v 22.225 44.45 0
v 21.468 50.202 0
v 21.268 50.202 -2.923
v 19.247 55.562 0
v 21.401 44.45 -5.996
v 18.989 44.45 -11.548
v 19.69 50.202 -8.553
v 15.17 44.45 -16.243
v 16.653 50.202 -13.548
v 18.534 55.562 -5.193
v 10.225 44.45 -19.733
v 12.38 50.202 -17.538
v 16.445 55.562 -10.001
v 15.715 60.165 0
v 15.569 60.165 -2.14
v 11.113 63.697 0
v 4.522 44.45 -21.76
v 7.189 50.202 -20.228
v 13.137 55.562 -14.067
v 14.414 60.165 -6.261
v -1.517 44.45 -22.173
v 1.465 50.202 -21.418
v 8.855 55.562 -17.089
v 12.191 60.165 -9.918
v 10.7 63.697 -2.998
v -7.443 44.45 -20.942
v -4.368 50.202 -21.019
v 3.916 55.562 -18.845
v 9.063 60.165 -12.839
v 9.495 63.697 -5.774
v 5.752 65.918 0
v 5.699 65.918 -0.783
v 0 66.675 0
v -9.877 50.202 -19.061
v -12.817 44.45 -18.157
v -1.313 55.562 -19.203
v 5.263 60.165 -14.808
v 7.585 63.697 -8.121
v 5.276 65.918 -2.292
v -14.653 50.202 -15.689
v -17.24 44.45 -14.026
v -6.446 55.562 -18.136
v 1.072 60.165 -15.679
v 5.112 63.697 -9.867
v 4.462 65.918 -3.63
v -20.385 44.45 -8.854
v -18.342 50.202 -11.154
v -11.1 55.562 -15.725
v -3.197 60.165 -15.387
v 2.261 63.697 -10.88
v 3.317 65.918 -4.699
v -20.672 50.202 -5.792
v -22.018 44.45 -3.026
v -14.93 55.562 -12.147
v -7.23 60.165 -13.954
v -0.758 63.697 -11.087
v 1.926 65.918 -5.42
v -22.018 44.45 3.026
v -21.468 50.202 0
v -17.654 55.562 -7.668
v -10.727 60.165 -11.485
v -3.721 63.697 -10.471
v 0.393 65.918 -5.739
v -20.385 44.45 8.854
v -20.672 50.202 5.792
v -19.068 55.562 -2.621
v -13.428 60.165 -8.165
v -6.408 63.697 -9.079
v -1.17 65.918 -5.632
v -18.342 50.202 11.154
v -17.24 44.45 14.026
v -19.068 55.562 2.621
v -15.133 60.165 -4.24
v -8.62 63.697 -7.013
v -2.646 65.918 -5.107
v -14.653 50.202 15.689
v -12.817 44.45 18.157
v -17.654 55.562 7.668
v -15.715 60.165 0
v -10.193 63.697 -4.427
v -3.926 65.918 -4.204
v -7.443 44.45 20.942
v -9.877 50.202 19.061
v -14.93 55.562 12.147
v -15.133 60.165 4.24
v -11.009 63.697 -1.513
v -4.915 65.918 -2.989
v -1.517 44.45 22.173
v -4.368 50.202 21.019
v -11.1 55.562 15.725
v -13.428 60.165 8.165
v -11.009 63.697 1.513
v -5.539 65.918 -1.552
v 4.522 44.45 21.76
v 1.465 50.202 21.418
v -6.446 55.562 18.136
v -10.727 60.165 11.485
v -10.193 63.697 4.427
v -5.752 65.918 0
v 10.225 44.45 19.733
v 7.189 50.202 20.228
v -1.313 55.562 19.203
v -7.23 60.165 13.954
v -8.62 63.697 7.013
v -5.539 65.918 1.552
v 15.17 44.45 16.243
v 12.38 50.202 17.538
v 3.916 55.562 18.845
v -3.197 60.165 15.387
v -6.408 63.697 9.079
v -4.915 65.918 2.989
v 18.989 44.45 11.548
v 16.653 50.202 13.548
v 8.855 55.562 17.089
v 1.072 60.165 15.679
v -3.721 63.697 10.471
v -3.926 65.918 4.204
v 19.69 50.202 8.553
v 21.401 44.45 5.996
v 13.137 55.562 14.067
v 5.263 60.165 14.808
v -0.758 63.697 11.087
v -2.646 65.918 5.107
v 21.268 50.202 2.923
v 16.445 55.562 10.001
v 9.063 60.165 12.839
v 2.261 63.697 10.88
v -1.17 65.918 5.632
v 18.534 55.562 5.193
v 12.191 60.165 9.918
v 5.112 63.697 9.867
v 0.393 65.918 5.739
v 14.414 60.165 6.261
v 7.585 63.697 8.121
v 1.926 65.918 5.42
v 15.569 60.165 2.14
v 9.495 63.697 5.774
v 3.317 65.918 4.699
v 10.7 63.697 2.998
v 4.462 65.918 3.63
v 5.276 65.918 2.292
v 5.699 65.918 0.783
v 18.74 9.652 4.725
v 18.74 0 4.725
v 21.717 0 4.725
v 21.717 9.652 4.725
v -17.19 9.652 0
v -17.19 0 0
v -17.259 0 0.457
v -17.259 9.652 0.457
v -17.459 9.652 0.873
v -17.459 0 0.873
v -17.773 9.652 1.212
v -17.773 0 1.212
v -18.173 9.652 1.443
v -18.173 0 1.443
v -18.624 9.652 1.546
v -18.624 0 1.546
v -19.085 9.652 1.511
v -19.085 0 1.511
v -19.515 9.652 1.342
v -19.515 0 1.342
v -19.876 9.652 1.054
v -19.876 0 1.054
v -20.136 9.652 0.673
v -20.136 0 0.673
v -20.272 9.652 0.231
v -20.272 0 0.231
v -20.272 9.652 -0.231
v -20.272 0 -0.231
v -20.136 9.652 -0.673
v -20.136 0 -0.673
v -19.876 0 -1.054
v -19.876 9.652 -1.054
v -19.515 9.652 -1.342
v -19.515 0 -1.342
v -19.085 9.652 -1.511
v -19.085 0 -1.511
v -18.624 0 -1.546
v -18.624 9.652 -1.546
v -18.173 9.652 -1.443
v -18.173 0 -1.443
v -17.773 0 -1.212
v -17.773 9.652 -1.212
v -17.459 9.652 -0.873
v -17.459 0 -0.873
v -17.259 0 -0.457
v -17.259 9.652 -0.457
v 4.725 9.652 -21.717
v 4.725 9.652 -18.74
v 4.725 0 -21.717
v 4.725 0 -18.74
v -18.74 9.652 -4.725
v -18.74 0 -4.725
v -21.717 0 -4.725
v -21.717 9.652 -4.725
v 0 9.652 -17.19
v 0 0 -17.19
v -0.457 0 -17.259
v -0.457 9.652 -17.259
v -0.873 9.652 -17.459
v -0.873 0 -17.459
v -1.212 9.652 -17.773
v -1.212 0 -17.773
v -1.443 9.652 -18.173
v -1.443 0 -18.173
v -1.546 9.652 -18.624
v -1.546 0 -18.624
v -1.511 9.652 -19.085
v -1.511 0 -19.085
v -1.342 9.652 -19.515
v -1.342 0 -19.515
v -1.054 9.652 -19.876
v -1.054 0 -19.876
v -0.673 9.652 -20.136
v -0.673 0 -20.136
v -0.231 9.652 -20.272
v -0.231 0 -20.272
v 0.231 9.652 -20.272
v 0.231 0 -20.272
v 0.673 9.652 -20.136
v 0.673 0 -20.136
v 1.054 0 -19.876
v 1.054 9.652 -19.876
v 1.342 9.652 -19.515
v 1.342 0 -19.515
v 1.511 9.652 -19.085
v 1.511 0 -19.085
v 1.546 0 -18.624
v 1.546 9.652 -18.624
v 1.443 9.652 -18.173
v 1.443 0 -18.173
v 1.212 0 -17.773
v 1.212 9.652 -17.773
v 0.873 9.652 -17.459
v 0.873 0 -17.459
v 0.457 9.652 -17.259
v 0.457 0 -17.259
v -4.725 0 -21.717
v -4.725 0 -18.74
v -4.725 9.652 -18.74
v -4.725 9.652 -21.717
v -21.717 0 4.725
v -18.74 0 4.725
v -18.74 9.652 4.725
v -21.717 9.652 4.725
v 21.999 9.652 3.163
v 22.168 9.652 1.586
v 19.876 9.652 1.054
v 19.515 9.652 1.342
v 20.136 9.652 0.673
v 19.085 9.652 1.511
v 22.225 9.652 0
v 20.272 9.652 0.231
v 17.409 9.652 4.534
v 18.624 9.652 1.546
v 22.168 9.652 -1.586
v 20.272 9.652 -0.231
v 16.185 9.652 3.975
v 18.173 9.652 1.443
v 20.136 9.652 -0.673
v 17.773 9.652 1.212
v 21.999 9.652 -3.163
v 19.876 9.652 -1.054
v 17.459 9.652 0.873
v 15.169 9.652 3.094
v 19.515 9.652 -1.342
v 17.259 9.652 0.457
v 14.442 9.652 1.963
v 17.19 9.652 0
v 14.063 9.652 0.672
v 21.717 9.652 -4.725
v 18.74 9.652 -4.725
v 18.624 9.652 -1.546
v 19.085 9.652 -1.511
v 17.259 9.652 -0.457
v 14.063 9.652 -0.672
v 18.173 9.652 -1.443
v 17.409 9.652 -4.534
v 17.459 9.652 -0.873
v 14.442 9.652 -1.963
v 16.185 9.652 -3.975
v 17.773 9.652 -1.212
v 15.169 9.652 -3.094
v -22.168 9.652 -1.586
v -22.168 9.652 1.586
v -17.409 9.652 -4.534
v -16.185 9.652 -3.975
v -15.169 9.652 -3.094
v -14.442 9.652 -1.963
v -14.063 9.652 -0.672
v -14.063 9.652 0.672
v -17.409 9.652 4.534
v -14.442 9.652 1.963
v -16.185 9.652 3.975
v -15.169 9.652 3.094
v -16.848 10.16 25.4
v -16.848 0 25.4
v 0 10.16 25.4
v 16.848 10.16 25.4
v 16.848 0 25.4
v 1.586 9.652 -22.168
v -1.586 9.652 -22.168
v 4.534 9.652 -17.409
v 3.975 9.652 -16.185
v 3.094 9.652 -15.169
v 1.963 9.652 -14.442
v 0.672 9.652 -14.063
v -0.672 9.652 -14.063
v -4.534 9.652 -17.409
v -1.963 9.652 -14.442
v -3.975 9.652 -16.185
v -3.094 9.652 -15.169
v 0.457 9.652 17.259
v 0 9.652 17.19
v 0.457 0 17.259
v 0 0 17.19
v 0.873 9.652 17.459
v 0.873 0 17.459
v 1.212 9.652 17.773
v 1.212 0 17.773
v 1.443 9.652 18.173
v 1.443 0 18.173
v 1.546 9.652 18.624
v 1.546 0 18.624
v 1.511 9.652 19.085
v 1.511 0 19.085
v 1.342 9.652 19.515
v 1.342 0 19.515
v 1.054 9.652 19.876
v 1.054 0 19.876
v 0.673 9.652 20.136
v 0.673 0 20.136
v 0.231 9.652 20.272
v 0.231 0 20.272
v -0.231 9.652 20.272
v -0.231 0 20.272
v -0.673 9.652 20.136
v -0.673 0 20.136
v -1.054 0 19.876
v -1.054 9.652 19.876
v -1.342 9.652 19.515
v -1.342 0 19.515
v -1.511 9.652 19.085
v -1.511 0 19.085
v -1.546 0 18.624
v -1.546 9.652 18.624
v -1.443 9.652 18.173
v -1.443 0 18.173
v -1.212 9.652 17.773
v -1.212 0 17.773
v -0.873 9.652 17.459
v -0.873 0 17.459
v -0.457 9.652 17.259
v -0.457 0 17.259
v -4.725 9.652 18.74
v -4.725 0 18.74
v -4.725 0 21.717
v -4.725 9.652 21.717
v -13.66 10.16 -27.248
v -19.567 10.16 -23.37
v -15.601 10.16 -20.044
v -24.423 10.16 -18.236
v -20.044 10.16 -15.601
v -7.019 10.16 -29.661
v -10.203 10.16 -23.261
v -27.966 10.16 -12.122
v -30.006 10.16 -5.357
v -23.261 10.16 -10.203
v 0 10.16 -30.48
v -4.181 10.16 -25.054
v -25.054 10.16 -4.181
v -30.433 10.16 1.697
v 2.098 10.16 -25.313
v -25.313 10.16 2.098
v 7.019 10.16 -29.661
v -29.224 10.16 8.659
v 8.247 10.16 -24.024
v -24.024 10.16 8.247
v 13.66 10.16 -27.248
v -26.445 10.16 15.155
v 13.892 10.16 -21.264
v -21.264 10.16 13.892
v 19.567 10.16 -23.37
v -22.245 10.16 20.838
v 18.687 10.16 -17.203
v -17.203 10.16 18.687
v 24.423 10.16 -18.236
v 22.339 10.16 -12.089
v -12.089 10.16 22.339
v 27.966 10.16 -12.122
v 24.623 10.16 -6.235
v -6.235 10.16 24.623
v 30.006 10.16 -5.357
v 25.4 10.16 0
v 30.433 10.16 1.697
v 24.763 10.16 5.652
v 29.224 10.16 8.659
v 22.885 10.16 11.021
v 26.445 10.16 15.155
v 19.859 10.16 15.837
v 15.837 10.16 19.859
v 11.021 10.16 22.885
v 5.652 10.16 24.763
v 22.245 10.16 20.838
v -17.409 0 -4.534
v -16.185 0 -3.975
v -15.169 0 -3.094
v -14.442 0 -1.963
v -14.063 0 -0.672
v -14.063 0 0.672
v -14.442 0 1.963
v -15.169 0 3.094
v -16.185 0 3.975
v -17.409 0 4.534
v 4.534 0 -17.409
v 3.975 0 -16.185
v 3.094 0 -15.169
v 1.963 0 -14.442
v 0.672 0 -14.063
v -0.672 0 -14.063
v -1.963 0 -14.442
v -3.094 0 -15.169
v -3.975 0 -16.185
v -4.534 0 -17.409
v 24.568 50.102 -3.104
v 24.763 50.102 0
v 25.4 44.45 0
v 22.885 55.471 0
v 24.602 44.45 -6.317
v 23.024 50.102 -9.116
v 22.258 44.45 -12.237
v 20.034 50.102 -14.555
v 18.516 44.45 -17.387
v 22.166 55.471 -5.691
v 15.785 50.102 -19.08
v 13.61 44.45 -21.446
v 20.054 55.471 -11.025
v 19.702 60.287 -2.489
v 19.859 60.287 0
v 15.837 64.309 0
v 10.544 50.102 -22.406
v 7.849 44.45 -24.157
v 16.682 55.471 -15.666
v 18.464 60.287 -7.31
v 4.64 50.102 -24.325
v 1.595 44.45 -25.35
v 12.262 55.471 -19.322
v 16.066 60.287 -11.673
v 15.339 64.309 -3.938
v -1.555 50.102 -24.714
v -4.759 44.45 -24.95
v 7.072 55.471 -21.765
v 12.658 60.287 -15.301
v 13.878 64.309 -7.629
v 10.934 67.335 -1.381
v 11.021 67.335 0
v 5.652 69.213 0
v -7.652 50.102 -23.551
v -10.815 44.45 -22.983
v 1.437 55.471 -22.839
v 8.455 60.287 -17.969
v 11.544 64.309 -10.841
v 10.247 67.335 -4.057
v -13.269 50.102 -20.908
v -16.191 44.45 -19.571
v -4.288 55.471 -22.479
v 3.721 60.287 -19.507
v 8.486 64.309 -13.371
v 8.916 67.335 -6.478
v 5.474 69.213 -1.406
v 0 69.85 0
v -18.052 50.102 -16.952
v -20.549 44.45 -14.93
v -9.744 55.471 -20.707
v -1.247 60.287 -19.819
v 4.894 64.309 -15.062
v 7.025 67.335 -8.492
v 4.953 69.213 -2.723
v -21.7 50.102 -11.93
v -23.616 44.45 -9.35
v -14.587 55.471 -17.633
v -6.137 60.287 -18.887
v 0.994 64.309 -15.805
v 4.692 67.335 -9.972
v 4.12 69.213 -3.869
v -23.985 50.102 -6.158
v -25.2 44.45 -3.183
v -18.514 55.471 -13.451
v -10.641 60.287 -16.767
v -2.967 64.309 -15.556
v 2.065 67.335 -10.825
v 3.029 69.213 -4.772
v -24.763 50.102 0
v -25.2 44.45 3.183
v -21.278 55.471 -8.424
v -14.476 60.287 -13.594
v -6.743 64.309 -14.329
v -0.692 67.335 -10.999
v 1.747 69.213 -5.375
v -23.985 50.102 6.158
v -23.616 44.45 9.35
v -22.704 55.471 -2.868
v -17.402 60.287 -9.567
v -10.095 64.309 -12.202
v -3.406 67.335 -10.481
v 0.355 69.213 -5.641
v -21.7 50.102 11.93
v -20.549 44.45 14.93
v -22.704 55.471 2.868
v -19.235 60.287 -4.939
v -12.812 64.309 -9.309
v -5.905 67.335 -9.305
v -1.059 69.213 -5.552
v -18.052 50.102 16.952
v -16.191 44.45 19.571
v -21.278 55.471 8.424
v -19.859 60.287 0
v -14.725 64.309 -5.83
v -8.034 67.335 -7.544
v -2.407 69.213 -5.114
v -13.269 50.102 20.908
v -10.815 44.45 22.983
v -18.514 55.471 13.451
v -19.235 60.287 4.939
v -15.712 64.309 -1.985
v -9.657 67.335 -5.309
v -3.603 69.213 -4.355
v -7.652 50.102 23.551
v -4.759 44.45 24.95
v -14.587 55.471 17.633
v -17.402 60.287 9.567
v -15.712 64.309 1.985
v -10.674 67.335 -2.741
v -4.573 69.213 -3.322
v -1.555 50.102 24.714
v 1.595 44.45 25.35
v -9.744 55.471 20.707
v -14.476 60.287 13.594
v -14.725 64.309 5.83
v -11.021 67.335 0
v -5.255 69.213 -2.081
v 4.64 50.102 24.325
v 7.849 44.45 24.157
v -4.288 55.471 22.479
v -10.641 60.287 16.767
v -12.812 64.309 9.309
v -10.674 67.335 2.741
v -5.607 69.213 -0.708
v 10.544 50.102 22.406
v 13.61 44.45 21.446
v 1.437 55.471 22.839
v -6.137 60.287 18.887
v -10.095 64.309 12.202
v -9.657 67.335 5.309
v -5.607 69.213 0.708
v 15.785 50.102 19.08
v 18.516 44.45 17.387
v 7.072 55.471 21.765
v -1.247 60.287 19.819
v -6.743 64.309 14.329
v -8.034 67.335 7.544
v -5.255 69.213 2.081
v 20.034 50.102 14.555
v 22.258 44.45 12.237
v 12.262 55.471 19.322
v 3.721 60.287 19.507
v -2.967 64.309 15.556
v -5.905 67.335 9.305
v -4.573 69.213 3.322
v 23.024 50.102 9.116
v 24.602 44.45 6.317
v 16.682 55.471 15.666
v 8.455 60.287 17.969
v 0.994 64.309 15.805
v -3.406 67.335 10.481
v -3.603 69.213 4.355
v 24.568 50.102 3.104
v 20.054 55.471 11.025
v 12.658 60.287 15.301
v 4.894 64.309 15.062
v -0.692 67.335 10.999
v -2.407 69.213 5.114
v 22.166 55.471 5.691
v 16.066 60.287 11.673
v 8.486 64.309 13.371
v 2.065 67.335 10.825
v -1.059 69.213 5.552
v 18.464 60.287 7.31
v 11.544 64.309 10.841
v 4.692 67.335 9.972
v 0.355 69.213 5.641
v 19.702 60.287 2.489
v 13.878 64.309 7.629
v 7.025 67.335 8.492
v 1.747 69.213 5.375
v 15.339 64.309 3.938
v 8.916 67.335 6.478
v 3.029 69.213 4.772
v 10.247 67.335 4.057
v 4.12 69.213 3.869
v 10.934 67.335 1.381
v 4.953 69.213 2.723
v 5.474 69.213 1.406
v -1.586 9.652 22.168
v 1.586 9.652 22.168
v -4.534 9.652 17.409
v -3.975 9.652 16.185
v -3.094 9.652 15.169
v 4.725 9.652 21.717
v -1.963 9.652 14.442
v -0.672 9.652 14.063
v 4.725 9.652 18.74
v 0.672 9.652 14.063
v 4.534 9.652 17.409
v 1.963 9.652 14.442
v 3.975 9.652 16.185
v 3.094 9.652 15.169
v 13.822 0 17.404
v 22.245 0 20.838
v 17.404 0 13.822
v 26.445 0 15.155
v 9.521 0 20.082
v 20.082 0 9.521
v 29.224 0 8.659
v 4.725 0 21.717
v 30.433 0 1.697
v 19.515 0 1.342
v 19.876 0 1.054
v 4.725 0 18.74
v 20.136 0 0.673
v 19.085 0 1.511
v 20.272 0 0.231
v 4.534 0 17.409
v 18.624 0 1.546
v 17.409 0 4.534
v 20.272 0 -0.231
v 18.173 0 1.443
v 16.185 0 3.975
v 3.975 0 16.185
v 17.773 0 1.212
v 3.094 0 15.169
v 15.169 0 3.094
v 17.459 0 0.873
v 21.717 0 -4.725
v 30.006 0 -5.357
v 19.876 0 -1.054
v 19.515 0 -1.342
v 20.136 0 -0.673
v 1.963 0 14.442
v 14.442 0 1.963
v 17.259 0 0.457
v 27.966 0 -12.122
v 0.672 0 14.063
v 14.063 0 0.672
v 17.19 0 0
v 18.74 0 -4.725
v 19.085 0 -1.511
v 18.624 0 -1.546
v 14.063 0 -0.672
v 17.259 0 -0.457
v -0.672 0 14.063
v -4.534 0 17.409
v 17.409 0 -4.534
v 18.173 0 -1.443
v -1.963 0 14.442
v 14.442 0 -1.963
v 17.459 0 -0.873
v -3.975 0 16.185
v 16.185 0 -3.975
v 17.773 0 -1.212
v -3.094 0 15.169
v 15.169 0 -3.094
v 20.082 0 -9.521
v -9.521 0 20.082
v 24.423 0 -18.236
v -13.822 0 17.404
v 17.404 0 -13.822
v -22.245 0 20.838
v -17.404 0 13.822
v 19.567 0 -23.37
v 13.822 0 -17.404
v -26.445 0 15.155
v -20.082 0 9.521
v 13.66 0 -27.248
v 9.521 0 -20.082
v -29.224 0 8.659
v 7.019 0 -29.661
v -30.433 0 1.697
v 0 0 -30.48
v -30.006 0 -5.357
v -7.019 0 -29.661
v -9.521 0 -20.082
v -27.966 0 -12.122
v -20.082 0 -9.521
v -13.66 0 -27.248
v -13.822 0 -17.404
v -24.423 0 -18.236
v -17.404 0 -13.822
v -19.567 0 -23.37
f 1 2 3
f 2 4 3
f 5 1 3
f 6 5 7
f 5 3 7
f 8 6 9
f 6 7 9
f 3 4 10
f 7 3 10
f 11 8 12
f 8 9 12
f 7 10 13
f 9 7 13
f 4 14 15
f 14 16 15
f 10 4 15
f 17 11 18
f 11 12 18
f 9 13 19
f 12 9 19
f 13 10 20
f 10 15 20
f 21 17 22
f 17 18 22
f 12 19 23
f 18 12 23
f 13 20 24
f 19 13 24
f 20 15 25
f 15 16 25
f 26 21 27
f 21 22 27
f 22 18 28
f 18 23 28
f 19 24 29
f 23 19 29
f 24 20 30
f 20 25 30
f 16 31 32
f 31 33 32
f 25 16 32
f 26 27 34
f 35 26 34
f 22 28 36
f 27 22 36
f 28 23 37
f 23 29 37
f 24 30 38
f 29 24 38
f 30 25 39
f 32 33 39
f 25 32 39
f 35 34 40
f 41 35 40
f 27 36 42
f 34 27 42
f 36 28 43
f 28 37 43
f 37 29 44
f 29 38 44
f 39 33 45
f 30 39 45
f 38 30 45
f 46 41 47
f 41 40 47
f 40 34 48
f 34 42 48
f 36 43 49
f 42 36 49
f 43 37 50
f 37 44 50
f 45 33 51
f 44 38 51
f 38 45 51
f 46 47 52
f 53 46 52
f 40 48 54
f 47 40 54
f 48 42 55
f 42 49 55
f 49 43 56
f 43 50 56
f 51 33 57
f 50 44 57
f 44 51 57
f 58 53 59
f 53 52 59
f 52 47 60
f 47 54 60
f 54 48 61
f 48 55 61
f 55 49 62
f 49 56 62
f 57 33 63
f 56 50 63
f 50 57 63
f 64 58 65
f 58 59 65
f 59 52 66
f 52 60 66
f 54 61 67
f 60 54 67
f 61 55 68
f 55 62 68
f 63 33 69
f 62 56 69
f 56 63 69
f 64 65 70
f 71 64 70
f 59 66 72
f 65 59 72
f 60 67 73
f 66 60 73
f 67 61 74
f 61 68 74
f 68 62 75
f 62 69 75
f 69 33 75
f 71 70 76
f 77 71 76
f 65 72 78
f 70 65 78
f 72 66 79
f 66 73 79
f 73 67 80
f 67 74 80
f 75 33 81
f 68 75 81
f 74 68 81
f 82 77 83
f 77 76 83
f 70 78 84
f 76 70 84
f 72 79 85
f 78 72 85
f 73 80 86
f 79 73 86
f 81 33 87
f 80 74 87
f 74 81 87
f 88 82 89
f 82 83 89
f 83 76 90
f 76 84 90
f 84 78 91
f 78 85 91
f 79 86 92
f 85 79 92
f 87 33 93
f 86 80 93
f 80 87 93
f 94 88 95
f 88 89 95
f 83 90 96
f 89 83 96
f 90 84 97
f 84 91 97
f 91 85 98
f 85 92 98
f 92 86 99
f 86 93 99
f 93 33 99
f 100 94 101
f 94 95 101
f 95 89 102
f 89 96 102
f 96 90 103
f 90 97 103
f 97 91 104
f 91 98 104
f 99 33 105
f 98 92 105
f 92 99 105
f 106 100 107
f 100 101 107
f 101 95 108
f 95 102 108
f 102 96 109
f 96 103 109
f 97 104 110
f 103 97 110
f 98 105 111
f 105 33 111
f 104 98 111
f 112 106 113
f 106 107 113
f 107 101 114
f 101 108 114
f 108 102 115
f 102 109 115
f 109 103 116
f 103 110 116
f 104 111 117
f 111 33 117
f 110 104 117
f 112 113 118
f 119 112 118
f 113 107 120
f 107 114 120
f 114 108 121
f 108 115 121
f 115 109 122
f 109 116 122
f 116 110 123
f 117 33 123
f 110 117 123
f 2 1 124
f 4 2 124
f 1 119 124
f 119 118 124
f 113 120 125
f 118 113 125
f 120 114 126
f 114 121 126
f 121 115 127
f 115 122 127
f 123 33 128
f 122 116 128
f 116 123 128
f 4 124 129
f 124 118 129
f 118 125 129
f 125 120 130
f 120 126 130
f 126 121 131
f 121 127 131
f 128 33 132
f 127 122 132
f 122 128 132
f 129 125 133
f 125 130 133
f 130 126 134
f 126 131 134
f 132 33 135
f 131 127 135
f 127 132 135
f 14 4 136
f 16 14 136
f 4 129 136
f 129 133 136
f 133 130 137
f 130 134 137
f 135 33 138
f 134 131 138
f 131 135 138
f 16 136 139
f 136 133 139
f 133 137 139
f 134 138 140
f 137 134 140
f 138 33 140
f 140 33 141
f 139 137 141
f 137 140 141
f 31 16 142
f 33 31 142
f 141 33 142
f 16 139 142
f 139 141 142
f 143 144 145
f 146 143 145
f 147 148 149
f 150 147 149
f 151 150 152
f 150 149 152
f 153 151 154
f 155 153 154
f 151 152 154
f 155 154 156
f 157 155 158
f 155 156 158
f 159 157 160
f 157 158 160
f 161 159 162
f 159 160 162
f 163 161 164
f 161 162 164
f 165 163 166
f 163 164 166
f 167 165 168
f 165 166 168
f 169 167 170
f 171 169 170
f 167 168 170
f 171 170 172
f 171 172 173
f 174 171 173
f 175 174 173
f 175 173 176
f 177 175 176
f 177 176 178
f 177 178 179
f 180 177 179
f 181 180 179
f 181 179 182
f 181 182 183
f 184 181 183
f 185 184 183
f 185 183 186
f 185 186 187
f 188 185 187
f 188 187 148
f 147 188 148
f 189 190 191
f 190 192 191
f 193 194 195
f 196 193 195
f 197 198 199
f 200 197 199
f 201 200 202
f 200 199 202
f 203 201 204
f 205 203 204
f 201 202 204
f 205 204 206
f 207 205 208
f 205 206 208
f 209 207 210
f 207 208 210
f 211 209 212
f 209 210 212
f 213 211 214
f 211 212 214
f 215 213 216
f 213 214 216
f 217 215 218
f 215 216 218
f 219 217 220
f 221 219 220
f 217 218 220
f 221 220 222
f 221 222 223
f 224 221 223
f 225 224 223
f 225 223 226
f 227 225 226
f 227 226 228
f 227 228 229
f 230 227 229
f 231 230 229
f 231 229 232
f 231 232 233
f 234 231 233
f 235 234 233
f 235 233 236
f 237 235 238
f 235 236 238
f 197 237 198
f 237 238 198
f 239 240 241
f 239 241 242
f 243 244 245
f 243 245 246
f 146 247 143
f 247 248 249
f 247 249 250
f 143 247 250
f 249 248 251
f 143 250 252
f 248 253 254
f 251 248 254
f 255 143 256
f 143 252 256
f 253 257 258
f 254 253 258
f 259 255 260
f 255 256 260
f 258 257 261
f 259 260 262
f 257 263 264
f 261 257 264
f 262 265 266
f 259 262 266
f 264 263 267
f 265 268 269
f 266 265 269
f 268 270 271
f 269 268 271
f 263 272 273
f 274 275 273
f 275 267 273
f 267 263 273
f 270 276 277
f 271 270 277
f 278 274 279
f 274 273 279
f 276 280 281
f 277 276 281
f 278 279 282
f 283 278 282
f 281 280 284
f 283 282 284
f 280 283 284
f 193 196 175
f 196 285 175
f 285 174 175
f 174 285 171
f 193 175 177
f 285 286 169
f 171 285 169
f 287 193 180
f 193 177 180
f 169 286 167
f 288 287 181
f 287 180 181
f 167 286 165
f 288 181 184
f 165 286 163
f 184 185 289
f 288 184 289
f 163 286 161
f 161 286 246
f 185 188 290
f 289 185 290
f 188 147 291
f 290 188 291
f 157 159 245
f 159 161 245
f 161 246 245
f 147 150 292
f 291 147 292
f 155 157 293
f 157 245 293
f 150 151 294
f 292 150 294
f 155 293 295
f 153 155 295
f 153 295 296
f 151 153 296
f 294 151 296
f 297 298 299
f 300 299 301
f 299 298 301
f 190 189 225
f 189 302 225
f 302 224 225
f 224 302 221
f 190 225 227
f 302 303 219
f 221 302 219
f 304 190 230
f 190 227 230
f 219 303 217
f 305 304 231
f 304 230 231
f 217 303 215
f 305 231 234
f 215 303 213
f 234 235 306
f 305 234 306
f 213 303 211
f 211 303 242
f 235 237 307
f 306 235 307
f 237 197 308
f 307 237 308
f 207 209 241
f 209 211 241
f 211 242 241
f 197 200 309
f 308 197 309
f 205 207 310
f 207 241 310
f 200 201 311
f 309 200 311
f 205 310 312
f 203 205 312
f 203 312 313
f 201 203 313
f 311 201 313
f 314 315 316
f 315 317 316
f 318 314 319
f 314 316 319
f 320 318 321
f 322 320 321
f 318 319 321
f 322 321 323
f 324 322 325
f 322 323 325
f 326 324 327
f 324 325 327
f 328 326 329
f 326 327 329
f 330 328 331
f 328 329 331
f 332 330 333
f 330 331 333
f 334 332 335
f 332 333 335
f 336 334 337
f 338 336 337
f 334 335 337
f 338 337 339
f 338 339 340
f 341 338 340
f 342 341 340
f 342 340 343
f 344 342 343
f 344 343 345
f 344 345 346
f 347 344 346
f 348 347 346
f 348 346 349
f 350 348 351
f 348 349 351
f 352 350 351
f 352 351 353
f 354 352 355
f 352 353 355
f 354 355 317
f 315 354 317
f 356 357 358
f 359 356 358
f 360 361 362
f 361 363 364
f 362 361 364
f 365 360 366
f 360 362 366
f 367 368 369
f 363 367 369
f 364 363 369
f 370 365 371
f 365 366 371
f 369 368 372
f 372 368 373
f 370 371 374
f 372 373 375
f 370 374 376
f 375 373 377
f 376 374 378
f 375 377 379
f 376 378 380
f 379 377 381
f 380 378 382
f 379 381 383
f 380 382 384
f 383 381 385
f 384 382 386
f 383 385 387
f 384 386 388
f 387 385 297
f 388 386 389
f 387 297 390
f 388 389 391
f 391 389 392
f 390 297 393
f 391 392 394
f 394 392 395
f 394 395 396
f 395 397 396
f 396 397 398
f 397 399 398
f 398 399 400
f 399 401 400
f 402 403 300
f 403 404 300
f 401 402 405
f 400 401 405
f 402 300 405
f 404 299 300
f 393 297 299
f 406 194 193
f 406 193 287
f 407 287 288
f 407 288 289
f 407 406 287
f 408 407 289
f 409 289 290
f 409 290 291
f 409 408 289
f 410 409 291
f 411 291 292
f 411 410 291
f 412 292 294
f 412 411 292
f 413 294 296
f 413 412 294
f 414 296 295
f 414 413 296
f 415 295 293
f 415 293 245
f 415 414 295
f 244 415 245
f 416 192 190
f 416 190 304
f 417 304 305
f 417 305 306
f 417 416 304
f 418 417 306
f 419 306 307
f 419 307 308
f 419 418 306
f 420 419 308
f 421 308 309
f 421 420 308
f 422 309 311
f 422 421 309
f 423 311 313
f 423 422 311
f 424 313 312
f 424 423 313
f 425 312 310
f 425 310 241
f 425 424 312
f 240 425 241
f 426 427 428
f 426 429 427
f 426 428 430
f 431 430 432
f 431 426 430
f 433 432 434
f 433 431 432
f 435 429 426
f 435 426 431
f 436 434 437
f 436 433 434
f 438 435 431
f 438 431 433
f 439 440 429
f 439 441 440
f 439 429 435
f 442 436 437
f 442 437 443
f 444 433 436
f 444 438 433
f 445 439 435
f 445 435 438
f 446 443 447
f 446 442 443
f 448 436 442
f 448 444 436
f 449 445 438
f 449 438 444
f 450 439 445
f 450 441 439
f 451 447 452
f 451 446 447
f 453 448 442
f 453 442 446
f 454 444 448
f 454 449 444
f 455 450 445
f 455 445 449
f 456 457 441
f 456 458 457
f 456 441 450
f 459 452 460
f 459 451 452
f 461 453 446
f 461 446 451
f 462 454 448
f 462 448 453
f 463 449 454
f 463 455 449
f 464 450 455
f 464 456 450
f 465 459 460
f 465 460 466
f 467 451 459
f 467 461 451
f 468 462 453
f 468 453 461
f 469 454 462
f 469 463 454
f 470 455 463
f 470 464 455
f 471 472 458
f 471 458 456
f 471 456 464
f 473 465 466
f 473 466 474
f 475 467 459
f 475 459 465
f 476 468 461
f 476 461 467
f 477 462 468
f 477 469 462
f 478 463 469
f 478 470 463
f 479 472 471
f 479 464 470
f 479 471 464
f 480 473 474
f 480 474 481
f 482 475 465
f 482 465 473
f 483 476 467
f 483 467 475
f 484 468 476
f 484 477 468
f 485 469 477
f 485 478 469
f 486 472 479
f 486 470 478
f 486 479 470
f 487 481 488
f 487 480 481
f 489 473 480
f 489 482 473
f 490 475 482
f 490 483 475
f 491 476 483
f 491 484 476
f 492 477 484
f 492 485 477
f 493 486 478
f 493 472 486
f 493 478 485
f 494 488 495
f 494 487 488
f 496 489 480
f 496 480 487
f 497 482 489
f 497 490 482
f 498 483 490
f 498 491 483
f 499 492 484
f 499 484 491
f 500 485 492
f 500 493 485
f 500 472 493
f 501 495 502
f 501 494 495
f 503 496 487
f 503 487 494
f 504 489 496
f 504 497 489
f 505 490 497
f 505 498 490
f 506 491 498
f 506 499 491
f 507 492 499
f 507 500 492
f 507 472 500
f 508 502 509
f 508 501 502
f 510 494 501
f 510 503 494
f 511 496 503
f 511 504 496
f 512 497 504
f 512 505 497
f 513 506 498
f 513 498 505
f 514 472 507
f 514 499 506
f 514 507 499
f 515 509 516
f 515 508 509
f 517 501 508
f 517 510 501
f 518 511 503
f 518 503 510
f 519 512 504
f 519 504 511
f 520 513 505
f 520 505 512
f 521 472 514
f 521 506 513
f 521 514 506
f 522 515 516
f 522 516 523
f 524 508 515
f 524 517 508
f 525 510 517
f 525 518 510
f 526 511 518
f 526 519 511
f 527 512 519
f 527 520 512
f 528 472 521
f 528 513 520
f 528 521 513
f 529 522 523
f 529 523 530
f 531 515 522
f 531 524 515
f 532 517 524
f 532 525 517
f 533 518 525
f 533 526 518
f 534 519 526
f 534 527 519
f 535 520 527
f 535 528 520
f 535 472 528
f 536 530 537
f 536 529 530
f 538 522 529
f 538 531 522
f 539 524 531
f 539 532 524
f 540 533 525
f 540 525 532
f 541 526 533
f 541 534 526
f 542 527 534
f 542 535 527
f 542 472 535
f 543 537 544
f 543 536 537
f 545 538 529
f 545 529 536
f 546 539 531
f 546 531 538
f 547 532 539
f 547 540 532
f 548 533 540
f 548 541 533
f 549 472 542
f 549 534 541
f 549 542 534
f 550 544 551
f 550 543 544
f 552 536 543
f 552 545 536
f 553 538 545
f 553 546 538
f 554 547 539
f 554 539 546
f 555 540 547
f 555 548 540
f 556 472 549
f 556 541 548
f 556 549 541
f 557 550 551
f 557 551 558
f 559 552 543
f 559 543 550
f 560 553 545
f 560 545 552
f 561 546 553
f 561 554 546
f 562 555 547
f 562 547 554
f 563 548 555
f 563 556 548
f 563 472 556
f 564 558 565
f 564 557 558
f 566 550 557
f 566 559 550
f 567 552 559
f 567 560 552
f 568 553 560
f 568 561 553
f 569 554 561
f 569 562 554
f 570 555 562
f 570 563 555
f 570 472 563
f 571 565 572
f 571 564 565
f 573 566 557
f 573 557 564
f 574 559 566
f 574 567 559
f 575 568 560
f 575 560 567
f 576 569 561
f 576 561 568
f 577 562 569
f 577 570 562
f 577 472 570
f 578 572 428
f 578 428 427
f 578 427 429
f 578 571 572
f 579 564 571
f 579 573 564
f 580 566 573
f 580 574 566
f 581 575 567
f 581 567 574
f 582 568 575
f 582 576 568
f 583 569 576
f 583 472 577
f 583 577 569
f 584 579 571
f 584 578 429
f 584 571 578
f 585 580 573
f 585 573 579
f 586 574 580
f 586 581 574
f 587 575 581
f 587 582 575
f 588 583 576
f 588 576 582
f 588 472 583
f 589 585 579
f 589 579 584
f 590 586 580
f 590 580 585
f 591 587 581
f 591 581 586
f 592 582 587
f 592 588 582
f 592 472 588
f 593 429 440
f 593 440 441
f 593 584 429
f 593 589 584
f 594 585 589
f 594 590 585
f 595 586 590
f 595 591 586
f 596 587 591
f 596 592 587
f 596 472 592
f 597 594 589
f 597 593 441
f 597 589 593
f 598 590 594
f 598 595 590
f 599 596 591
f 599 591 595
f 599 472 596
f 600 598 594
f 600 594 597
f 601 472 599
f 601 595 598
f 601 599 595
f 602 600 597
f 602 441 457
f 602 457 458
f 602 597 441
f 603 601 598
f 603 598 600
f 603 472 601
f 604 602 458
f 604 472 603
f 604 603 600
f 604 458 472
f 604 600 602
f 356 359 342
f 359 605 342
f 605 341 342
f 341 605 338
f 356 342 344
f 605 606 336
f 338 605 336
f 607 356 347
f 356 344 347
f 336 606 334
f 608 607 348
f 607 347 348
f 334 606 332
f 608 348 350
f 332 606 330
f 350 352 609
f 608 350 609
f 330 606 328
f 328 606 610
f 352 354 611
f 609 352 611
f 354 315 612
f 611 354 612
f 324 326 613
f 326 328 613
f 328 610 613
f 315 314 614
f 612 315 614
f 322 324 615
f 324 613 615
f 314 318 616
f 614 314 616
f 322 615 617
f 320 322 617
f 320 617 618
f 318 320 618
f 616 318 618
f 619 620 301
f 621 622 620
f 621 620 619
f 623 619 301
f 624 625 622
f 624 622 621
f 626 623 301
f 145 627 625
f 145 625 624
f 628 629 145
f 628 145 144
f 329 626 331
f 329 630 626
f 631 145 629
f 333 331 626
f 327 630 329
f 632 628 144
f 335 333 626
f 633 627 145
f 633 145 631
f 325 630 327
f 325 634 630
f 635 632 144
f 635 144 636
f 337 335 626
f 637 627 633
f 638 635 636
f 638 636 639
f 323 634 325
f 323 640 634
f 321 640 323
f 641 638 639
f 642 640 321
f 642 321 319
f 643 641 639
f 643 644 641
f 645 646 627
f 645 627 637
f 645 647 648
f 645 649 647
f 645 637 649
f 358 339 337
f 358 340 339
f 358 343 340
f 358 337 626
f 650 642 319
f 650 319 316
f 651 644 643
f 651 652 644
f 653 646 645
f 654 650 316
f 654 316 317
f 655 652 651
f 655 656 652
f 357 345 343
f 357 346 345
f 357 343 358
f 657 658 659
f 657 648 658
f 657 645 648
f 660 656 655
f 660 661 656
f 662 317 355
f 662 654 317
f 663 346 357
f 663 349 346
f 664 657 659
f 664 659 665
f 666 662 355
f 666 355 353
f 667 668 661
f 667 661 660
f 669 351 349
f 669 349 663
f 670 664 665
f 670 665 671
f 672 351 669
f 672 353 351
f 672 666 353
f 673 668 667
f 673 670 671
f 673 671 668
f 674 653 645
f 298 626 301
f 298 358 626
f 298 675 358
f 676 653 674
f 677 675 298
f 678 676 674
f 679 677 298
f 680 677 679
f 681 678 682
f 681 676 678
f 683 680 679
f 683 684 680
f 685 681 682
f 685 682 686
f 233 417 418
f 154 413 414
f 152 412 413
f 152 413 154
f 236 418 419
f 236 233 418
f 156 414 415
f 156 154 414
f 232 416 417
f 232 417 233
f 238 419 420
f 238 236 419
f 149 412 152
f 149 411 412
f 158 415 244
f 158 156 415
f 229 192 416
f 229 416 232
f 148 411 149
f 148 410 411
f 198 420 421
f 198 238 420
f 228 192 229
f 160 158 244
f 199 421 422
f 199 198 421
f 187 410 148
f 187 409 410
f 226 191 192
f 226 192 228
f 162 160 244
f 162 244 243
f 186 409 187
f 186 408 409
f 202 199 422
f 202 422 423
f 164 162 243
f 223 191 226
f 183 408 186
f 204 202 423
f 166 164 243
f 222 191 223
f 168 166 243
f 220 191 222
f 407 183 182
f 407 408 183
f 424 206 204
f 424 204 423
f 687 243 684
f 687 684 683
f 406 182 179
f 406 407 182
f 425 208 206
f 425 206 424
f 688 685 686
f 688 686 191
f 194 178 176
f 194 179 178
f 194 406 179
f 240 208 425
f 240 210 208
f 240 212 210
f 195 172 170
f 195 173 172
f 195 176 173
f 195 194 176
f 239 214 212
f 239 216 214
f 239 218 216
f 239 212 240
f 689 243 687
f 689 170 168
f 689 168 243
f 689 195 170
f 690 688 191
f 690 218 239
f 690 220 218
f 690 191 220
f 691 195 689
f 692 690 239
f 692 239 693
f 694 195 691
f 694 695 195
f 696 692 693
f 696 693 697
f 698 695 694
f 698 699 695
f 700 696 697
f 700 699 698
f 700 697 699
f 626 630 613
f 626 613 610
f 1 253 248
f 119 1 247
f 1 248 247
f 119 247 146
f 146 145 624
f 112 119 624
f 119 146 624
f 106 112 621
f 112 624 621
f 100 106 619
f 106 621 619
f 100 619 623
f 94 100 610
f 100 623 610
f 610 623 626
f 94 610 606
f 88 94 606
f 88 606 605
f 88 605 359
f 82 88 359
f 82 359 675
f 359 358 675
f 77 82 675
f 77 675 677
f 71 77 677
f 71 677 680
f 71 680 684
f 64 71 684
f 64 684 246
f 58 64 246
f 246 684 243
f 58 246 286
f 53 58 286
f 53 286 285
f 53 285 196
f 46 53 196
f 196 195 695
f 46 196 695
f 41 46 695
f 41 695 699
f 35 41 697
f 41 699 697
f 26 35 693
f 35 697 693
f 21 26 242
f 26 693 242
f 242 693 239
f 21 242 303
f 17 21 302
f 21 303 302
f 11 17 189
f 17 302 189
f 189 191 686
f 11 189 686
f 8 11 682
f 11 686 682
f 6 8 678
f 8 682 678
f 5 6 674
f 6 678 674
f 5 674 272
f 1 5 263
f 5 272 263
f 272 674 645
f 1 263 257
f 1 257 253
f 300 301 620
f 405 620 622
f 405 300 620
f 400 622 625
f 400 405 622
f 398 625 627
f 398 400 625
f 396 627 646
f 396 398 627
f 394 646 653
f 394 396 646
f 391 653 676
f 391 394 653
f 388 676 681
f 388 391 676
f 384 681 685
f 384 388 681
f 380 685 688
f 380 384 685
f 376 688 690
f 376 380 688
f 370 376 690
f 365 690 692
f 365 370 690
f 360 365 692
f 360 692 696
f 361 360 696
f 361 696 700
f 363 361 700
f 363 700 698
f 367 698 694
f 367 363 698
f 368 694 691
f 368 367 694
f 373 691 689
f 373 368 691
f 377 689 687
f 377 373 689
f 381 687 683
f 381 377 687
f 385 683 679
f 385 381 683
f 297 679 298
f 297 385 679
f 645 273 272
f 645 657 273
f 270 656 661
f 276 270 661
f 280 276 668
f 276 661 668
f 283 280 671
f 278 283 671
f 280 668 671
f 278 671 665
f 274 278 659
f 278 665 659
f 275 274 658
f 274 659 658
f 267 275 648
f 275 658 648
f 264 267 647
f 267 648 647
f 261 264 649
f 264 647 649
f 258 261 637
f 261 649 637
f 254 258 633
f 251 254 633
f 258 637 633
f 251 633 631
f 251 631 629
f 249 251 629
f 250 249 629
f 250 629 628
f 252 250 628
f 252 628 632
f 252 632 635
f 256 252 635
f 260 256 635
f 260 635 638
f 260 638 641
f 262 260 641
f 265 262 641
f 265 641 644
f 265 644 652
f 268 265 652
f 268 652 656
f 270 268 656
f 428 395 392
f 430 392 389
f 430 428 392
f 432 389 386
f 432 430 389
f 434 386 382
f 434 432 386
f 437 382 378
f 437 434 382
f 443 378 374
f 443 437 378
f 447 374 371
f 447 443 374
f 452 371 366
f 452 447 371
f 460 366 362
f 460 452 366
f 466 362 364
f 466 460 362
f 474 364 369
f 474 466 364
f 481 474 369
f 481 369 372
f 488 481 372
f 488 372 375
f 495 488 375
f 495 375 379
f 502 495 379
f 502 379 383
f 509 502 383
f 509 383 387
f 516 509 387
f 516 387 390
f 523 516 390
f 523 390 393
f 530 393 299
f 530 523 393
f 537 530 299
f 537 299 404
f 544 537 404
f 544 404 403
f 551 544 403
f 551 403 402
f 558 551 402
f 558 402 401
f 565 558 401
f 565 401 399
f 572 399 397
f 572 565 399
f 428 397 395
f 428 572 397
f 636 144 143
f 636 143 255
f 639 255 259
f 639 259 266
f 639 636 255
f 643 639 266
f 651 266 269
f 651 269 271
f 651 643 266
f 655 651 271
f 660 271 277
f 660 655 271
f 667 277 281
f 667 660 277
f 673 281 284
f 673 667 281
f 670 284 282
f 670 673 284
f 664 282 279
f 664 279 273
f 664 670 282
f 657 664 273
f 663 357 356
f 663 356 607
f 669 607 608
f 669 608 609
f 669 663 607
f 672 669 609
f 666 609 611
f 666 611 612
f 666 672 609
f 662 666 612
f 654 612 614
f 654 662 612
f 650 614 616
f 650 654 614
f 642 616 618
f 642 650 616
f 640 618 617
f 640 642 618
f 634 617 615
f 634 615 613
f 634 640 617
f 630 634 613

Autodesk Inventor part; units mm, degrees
ref_plane "YZ Plane" through (0, 0, 0) normal (1, 0, 0) x (0, 1, 0)
ref_plane "XZ Plane" through (0, 0, 0) normal (0, 1, 0) x (-1, 0, 0)
ref_plane "XY Plane" through (0, 0, 0) normal (0, 0, 1) x (1, 0, 0)
sketch "Sketch1" plane through (0, 0, 0) normal (0, 0, 1) x (1, 0, 0)
  line L0 (22.225, 0) -> (30.48, 0)
  line L1 (30.48, 0) -> (30.48, 10.16)
  line L2 (30.48, 10.16) -> (25.4, 10.16)
  line L3 (25.4, 10.16) -> (25.4, 44.45)
  line L4 (25.4, 44.45) -> (0, 44.45) construction
  line L5 (0, 10.16) -> (0, 0)
  arc A0 (25.4, 44.45) -> (0, 69.85) centre (0, 44.45) ccw
  line L6 (0, 66.675) -> (0, 69.85)
  arc A1 (22.225, 44.45) -> (0, 66.675) centre (0, 44.45) ccw
  line L7 (22.225, 44.45) -> (22.225, 0)
  line L8 (0, 66.675) -> (0, 0) construction
  line L9 (0, 0) -> (22.225, 0) construction
  dimension "d2" = 3.175
  dimension "d3" = 10.16
  dimension "d4" = 69.85
  dimension "d6" = 25.4
  dimension "d7" = 5.08
revolve "Revolution1" add sketch "Sketch1" angle 360 about axis through (0, 66.675, 0) along (0, -1, 0)
sketch "Sketch3" plane through (0, 0, 0) normal (0, -1, 0) x (1, 0, 0)
  circle A0 centre (0, 0) radius 25.4 construction
  circle A1 centre (0, 0) radius 30.48 projected
  line L0 (0, 25.4) -> (-16.8485, 25.4)
  line L1 (0, 25.4) -> (16.8485, 25.4)
  arc A2 (-16.8485, 25.4) -> (0, 30.48) centre (0, 0) ccw
extrude "Extrusion1" cut sketch "Sketch3" against normal up to next contours L1 L0 A1 picked at (-9.4832, 26.3286)
sketch "Sketch4" plane through (0, 0, 0) normal (0, -1, 0) x (1, 0, 0)
  arc A0 (-18.7397, -4.725) -> (-18.7397, 4.725) centre (-18.7397, 0) ccw
  circle A1 centre (-18.7397, 0) radius 1.55
  line L0 (-18.7397, 4.725) -> (-21.7169, 4.725)
  line L1 (-18.7397, -4.725) -> (-21.7169, -4.725)
  arc A2 (-21.7169, 4.725) -> (-21.7169, -4.725) centre (0, 0) ccw
  point P0 (0, 0)
  dimension "d13" = 3.1
  dimension "d14" = 3.175
extrude "Extrusion2" add sketch "Sketch4" against normal blind 9.652
pattern_circular "Circular Pattern1" count 4 over 360 about axis through (0, 27.305, 0) along (0, -1, 0) of "Extrusion2"
properties part number "led"
